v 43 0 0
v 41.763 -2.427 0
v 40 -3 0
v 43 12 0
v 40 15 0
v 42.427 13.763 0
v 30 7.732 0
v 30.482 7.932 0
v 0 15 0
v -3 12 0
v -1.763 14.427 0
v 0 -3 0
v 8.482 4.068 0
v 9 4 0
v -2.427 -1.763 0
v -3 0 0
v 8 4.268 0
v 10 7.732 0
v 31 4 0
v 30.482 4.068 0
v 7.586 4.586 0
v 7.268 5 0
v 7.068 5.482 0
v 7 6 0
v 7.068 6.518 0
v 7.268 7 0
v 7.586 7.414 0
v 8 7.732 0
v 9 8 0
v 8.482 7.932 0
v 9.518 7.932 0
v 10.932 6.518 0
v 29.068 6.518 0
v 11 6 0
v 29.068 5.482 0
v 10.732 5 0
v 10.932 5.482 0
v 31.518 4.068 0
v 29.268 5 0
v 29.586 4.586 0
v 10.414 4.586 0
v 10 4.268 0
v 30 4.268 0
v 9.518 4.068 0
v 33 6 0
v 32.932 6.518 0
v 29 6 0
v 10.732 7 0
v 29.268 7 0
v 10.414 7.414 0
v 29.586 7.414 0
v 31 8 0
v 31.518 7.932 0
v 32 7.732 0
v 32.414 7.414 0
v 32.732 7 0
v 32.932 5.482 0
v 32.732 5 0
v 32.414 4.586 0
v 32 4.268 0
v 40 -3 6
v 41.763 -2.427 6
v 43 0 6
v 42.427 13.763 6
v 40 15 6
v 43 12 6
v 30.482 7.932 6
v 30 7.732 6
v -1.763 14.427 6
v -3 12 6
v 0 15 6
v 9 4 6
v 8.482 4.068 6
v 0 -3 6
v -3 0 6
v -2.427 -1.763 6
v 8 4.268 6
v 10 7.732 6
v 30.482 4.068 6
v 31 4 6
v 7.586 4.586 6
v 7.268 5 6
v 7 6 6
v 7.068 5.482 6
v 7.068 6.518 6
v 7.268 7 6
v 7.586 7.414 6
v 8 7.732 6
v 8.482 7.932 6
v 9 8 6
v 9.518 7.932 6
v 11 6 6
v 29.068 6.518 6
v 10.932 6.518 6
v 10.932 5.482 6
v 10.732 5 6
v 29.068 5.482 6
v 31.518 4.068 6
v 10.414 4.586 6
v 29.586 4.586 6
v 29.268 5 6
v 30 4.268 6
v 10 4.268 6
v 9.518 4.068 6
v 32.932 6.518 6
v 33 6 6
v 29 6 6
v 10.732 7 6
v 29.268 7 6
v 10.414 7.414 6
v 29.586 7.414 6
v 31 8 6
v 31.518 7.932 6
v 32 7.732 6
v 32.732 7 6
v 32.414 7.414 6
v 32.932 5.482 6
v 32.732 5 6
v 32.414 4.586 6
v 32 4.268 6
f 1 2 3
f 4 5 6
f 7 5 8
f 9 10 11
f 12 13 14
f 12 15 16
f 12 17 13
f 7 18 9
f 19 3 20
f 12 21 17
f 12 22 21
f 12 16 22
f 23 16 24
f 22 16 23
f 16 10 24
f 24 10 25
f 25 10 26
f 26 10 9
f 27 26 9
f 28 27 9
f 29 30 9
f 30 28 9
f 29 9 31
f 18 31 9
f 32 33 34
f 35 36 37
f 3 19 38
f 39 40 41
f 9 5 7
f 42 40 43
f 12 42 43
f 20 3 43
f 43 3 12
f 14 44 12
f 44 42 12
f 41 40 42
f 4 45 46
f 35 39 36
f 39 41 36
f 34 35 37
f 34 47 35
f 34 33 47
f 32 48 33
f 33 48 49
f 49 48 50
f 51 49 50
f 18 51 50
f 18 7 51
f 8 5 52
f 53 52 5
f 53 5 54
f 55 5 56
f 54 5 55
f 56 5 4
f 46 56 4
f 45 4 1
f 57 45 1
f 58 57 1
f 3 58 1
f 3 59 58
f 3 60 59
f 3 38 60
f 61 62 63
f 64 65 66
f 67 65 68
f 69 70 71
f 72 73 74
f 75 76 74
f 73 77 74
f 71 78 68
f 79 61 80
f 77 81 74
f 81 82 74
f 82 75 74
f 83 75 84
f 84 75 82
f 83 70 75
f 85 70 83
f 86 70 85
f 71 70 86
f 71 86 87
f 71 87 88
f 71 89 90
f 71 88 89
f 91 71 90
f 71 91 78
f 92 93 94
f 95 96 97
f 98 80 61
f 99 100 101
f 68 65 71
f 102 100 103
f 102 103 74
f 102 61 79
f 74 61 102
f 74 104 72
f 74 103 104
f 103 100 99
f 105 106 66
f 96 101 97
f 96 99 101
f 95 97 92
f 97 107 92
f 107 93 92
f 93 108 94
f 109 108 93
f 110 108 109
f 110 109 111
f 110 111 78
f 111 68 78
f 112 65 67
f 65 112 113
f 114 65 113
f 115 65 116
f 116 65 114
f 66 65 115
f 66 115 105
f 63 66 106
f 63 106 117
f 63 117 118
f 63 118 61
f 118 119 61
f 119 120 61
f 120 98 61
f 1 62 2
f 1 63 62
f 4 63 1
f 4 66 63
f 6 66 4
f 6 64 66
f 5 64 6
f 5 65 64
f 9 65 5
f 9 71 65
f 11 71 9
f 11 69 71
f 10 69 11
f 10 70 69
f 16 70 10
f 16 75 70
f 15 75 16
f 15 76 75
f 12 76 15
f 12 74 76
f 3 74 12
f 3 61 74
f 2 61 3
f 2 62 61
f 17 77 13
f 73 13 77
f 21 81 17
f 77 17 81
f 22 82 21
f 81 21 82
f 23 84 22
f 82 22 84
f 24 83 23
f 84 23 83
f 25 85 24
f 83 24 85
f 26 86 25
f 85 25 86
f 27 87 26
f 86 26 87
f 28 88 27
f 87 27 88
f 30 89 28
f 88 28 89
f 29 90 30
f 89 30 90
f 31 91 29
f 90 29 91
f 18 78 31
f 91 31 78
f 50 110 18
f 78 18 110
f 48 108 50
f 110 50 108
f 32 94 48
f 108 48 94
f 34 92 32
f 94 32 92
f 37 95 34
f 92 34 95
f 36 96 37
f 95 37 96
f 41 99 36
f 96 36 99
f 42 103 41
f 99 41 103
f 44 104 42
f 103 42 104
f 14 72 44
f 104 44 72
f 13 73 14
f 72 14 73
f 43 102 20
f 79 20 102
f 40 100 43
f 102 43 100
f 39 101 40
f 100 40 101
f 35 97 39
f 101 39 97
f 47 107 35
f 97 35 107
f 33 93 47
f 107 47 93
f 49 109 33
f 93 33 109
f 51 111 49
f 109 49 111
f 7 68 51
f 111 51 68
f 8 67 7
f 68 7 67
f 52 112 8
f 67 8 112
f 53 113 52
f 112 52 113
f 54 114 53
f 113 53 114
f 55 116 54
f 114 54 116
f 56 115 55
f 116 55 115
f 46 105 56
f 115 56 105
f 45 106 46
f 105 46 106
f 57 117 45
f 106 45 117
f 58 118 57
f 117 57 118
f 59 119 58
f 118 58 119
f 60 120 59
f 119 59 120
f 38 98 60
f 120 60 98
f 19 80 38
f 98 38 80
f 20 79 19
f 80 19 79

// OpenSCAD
// file: hardware.scad
// A tiny reusable 2D-profile library (modules with defaults → `use`-friendly).
module rounded_bar(l, h, r) offset(r = r) square([l, h]);
module hole(r = 1.5) circle(r, $fn = 24);
// main file
// A rounded bar with two through-holes. The holes are subtracted in 2D (the new
// polygon-boolean kernel), then extruded — so it never touches the 3D CSG path.
use <hardware.scad>
linear_extrude(6)
difference() {
    rounded_bar(40, 12, 3);
    translate([9, 6])  hole(2);
    translate([31, 6]) hole(2);
}
